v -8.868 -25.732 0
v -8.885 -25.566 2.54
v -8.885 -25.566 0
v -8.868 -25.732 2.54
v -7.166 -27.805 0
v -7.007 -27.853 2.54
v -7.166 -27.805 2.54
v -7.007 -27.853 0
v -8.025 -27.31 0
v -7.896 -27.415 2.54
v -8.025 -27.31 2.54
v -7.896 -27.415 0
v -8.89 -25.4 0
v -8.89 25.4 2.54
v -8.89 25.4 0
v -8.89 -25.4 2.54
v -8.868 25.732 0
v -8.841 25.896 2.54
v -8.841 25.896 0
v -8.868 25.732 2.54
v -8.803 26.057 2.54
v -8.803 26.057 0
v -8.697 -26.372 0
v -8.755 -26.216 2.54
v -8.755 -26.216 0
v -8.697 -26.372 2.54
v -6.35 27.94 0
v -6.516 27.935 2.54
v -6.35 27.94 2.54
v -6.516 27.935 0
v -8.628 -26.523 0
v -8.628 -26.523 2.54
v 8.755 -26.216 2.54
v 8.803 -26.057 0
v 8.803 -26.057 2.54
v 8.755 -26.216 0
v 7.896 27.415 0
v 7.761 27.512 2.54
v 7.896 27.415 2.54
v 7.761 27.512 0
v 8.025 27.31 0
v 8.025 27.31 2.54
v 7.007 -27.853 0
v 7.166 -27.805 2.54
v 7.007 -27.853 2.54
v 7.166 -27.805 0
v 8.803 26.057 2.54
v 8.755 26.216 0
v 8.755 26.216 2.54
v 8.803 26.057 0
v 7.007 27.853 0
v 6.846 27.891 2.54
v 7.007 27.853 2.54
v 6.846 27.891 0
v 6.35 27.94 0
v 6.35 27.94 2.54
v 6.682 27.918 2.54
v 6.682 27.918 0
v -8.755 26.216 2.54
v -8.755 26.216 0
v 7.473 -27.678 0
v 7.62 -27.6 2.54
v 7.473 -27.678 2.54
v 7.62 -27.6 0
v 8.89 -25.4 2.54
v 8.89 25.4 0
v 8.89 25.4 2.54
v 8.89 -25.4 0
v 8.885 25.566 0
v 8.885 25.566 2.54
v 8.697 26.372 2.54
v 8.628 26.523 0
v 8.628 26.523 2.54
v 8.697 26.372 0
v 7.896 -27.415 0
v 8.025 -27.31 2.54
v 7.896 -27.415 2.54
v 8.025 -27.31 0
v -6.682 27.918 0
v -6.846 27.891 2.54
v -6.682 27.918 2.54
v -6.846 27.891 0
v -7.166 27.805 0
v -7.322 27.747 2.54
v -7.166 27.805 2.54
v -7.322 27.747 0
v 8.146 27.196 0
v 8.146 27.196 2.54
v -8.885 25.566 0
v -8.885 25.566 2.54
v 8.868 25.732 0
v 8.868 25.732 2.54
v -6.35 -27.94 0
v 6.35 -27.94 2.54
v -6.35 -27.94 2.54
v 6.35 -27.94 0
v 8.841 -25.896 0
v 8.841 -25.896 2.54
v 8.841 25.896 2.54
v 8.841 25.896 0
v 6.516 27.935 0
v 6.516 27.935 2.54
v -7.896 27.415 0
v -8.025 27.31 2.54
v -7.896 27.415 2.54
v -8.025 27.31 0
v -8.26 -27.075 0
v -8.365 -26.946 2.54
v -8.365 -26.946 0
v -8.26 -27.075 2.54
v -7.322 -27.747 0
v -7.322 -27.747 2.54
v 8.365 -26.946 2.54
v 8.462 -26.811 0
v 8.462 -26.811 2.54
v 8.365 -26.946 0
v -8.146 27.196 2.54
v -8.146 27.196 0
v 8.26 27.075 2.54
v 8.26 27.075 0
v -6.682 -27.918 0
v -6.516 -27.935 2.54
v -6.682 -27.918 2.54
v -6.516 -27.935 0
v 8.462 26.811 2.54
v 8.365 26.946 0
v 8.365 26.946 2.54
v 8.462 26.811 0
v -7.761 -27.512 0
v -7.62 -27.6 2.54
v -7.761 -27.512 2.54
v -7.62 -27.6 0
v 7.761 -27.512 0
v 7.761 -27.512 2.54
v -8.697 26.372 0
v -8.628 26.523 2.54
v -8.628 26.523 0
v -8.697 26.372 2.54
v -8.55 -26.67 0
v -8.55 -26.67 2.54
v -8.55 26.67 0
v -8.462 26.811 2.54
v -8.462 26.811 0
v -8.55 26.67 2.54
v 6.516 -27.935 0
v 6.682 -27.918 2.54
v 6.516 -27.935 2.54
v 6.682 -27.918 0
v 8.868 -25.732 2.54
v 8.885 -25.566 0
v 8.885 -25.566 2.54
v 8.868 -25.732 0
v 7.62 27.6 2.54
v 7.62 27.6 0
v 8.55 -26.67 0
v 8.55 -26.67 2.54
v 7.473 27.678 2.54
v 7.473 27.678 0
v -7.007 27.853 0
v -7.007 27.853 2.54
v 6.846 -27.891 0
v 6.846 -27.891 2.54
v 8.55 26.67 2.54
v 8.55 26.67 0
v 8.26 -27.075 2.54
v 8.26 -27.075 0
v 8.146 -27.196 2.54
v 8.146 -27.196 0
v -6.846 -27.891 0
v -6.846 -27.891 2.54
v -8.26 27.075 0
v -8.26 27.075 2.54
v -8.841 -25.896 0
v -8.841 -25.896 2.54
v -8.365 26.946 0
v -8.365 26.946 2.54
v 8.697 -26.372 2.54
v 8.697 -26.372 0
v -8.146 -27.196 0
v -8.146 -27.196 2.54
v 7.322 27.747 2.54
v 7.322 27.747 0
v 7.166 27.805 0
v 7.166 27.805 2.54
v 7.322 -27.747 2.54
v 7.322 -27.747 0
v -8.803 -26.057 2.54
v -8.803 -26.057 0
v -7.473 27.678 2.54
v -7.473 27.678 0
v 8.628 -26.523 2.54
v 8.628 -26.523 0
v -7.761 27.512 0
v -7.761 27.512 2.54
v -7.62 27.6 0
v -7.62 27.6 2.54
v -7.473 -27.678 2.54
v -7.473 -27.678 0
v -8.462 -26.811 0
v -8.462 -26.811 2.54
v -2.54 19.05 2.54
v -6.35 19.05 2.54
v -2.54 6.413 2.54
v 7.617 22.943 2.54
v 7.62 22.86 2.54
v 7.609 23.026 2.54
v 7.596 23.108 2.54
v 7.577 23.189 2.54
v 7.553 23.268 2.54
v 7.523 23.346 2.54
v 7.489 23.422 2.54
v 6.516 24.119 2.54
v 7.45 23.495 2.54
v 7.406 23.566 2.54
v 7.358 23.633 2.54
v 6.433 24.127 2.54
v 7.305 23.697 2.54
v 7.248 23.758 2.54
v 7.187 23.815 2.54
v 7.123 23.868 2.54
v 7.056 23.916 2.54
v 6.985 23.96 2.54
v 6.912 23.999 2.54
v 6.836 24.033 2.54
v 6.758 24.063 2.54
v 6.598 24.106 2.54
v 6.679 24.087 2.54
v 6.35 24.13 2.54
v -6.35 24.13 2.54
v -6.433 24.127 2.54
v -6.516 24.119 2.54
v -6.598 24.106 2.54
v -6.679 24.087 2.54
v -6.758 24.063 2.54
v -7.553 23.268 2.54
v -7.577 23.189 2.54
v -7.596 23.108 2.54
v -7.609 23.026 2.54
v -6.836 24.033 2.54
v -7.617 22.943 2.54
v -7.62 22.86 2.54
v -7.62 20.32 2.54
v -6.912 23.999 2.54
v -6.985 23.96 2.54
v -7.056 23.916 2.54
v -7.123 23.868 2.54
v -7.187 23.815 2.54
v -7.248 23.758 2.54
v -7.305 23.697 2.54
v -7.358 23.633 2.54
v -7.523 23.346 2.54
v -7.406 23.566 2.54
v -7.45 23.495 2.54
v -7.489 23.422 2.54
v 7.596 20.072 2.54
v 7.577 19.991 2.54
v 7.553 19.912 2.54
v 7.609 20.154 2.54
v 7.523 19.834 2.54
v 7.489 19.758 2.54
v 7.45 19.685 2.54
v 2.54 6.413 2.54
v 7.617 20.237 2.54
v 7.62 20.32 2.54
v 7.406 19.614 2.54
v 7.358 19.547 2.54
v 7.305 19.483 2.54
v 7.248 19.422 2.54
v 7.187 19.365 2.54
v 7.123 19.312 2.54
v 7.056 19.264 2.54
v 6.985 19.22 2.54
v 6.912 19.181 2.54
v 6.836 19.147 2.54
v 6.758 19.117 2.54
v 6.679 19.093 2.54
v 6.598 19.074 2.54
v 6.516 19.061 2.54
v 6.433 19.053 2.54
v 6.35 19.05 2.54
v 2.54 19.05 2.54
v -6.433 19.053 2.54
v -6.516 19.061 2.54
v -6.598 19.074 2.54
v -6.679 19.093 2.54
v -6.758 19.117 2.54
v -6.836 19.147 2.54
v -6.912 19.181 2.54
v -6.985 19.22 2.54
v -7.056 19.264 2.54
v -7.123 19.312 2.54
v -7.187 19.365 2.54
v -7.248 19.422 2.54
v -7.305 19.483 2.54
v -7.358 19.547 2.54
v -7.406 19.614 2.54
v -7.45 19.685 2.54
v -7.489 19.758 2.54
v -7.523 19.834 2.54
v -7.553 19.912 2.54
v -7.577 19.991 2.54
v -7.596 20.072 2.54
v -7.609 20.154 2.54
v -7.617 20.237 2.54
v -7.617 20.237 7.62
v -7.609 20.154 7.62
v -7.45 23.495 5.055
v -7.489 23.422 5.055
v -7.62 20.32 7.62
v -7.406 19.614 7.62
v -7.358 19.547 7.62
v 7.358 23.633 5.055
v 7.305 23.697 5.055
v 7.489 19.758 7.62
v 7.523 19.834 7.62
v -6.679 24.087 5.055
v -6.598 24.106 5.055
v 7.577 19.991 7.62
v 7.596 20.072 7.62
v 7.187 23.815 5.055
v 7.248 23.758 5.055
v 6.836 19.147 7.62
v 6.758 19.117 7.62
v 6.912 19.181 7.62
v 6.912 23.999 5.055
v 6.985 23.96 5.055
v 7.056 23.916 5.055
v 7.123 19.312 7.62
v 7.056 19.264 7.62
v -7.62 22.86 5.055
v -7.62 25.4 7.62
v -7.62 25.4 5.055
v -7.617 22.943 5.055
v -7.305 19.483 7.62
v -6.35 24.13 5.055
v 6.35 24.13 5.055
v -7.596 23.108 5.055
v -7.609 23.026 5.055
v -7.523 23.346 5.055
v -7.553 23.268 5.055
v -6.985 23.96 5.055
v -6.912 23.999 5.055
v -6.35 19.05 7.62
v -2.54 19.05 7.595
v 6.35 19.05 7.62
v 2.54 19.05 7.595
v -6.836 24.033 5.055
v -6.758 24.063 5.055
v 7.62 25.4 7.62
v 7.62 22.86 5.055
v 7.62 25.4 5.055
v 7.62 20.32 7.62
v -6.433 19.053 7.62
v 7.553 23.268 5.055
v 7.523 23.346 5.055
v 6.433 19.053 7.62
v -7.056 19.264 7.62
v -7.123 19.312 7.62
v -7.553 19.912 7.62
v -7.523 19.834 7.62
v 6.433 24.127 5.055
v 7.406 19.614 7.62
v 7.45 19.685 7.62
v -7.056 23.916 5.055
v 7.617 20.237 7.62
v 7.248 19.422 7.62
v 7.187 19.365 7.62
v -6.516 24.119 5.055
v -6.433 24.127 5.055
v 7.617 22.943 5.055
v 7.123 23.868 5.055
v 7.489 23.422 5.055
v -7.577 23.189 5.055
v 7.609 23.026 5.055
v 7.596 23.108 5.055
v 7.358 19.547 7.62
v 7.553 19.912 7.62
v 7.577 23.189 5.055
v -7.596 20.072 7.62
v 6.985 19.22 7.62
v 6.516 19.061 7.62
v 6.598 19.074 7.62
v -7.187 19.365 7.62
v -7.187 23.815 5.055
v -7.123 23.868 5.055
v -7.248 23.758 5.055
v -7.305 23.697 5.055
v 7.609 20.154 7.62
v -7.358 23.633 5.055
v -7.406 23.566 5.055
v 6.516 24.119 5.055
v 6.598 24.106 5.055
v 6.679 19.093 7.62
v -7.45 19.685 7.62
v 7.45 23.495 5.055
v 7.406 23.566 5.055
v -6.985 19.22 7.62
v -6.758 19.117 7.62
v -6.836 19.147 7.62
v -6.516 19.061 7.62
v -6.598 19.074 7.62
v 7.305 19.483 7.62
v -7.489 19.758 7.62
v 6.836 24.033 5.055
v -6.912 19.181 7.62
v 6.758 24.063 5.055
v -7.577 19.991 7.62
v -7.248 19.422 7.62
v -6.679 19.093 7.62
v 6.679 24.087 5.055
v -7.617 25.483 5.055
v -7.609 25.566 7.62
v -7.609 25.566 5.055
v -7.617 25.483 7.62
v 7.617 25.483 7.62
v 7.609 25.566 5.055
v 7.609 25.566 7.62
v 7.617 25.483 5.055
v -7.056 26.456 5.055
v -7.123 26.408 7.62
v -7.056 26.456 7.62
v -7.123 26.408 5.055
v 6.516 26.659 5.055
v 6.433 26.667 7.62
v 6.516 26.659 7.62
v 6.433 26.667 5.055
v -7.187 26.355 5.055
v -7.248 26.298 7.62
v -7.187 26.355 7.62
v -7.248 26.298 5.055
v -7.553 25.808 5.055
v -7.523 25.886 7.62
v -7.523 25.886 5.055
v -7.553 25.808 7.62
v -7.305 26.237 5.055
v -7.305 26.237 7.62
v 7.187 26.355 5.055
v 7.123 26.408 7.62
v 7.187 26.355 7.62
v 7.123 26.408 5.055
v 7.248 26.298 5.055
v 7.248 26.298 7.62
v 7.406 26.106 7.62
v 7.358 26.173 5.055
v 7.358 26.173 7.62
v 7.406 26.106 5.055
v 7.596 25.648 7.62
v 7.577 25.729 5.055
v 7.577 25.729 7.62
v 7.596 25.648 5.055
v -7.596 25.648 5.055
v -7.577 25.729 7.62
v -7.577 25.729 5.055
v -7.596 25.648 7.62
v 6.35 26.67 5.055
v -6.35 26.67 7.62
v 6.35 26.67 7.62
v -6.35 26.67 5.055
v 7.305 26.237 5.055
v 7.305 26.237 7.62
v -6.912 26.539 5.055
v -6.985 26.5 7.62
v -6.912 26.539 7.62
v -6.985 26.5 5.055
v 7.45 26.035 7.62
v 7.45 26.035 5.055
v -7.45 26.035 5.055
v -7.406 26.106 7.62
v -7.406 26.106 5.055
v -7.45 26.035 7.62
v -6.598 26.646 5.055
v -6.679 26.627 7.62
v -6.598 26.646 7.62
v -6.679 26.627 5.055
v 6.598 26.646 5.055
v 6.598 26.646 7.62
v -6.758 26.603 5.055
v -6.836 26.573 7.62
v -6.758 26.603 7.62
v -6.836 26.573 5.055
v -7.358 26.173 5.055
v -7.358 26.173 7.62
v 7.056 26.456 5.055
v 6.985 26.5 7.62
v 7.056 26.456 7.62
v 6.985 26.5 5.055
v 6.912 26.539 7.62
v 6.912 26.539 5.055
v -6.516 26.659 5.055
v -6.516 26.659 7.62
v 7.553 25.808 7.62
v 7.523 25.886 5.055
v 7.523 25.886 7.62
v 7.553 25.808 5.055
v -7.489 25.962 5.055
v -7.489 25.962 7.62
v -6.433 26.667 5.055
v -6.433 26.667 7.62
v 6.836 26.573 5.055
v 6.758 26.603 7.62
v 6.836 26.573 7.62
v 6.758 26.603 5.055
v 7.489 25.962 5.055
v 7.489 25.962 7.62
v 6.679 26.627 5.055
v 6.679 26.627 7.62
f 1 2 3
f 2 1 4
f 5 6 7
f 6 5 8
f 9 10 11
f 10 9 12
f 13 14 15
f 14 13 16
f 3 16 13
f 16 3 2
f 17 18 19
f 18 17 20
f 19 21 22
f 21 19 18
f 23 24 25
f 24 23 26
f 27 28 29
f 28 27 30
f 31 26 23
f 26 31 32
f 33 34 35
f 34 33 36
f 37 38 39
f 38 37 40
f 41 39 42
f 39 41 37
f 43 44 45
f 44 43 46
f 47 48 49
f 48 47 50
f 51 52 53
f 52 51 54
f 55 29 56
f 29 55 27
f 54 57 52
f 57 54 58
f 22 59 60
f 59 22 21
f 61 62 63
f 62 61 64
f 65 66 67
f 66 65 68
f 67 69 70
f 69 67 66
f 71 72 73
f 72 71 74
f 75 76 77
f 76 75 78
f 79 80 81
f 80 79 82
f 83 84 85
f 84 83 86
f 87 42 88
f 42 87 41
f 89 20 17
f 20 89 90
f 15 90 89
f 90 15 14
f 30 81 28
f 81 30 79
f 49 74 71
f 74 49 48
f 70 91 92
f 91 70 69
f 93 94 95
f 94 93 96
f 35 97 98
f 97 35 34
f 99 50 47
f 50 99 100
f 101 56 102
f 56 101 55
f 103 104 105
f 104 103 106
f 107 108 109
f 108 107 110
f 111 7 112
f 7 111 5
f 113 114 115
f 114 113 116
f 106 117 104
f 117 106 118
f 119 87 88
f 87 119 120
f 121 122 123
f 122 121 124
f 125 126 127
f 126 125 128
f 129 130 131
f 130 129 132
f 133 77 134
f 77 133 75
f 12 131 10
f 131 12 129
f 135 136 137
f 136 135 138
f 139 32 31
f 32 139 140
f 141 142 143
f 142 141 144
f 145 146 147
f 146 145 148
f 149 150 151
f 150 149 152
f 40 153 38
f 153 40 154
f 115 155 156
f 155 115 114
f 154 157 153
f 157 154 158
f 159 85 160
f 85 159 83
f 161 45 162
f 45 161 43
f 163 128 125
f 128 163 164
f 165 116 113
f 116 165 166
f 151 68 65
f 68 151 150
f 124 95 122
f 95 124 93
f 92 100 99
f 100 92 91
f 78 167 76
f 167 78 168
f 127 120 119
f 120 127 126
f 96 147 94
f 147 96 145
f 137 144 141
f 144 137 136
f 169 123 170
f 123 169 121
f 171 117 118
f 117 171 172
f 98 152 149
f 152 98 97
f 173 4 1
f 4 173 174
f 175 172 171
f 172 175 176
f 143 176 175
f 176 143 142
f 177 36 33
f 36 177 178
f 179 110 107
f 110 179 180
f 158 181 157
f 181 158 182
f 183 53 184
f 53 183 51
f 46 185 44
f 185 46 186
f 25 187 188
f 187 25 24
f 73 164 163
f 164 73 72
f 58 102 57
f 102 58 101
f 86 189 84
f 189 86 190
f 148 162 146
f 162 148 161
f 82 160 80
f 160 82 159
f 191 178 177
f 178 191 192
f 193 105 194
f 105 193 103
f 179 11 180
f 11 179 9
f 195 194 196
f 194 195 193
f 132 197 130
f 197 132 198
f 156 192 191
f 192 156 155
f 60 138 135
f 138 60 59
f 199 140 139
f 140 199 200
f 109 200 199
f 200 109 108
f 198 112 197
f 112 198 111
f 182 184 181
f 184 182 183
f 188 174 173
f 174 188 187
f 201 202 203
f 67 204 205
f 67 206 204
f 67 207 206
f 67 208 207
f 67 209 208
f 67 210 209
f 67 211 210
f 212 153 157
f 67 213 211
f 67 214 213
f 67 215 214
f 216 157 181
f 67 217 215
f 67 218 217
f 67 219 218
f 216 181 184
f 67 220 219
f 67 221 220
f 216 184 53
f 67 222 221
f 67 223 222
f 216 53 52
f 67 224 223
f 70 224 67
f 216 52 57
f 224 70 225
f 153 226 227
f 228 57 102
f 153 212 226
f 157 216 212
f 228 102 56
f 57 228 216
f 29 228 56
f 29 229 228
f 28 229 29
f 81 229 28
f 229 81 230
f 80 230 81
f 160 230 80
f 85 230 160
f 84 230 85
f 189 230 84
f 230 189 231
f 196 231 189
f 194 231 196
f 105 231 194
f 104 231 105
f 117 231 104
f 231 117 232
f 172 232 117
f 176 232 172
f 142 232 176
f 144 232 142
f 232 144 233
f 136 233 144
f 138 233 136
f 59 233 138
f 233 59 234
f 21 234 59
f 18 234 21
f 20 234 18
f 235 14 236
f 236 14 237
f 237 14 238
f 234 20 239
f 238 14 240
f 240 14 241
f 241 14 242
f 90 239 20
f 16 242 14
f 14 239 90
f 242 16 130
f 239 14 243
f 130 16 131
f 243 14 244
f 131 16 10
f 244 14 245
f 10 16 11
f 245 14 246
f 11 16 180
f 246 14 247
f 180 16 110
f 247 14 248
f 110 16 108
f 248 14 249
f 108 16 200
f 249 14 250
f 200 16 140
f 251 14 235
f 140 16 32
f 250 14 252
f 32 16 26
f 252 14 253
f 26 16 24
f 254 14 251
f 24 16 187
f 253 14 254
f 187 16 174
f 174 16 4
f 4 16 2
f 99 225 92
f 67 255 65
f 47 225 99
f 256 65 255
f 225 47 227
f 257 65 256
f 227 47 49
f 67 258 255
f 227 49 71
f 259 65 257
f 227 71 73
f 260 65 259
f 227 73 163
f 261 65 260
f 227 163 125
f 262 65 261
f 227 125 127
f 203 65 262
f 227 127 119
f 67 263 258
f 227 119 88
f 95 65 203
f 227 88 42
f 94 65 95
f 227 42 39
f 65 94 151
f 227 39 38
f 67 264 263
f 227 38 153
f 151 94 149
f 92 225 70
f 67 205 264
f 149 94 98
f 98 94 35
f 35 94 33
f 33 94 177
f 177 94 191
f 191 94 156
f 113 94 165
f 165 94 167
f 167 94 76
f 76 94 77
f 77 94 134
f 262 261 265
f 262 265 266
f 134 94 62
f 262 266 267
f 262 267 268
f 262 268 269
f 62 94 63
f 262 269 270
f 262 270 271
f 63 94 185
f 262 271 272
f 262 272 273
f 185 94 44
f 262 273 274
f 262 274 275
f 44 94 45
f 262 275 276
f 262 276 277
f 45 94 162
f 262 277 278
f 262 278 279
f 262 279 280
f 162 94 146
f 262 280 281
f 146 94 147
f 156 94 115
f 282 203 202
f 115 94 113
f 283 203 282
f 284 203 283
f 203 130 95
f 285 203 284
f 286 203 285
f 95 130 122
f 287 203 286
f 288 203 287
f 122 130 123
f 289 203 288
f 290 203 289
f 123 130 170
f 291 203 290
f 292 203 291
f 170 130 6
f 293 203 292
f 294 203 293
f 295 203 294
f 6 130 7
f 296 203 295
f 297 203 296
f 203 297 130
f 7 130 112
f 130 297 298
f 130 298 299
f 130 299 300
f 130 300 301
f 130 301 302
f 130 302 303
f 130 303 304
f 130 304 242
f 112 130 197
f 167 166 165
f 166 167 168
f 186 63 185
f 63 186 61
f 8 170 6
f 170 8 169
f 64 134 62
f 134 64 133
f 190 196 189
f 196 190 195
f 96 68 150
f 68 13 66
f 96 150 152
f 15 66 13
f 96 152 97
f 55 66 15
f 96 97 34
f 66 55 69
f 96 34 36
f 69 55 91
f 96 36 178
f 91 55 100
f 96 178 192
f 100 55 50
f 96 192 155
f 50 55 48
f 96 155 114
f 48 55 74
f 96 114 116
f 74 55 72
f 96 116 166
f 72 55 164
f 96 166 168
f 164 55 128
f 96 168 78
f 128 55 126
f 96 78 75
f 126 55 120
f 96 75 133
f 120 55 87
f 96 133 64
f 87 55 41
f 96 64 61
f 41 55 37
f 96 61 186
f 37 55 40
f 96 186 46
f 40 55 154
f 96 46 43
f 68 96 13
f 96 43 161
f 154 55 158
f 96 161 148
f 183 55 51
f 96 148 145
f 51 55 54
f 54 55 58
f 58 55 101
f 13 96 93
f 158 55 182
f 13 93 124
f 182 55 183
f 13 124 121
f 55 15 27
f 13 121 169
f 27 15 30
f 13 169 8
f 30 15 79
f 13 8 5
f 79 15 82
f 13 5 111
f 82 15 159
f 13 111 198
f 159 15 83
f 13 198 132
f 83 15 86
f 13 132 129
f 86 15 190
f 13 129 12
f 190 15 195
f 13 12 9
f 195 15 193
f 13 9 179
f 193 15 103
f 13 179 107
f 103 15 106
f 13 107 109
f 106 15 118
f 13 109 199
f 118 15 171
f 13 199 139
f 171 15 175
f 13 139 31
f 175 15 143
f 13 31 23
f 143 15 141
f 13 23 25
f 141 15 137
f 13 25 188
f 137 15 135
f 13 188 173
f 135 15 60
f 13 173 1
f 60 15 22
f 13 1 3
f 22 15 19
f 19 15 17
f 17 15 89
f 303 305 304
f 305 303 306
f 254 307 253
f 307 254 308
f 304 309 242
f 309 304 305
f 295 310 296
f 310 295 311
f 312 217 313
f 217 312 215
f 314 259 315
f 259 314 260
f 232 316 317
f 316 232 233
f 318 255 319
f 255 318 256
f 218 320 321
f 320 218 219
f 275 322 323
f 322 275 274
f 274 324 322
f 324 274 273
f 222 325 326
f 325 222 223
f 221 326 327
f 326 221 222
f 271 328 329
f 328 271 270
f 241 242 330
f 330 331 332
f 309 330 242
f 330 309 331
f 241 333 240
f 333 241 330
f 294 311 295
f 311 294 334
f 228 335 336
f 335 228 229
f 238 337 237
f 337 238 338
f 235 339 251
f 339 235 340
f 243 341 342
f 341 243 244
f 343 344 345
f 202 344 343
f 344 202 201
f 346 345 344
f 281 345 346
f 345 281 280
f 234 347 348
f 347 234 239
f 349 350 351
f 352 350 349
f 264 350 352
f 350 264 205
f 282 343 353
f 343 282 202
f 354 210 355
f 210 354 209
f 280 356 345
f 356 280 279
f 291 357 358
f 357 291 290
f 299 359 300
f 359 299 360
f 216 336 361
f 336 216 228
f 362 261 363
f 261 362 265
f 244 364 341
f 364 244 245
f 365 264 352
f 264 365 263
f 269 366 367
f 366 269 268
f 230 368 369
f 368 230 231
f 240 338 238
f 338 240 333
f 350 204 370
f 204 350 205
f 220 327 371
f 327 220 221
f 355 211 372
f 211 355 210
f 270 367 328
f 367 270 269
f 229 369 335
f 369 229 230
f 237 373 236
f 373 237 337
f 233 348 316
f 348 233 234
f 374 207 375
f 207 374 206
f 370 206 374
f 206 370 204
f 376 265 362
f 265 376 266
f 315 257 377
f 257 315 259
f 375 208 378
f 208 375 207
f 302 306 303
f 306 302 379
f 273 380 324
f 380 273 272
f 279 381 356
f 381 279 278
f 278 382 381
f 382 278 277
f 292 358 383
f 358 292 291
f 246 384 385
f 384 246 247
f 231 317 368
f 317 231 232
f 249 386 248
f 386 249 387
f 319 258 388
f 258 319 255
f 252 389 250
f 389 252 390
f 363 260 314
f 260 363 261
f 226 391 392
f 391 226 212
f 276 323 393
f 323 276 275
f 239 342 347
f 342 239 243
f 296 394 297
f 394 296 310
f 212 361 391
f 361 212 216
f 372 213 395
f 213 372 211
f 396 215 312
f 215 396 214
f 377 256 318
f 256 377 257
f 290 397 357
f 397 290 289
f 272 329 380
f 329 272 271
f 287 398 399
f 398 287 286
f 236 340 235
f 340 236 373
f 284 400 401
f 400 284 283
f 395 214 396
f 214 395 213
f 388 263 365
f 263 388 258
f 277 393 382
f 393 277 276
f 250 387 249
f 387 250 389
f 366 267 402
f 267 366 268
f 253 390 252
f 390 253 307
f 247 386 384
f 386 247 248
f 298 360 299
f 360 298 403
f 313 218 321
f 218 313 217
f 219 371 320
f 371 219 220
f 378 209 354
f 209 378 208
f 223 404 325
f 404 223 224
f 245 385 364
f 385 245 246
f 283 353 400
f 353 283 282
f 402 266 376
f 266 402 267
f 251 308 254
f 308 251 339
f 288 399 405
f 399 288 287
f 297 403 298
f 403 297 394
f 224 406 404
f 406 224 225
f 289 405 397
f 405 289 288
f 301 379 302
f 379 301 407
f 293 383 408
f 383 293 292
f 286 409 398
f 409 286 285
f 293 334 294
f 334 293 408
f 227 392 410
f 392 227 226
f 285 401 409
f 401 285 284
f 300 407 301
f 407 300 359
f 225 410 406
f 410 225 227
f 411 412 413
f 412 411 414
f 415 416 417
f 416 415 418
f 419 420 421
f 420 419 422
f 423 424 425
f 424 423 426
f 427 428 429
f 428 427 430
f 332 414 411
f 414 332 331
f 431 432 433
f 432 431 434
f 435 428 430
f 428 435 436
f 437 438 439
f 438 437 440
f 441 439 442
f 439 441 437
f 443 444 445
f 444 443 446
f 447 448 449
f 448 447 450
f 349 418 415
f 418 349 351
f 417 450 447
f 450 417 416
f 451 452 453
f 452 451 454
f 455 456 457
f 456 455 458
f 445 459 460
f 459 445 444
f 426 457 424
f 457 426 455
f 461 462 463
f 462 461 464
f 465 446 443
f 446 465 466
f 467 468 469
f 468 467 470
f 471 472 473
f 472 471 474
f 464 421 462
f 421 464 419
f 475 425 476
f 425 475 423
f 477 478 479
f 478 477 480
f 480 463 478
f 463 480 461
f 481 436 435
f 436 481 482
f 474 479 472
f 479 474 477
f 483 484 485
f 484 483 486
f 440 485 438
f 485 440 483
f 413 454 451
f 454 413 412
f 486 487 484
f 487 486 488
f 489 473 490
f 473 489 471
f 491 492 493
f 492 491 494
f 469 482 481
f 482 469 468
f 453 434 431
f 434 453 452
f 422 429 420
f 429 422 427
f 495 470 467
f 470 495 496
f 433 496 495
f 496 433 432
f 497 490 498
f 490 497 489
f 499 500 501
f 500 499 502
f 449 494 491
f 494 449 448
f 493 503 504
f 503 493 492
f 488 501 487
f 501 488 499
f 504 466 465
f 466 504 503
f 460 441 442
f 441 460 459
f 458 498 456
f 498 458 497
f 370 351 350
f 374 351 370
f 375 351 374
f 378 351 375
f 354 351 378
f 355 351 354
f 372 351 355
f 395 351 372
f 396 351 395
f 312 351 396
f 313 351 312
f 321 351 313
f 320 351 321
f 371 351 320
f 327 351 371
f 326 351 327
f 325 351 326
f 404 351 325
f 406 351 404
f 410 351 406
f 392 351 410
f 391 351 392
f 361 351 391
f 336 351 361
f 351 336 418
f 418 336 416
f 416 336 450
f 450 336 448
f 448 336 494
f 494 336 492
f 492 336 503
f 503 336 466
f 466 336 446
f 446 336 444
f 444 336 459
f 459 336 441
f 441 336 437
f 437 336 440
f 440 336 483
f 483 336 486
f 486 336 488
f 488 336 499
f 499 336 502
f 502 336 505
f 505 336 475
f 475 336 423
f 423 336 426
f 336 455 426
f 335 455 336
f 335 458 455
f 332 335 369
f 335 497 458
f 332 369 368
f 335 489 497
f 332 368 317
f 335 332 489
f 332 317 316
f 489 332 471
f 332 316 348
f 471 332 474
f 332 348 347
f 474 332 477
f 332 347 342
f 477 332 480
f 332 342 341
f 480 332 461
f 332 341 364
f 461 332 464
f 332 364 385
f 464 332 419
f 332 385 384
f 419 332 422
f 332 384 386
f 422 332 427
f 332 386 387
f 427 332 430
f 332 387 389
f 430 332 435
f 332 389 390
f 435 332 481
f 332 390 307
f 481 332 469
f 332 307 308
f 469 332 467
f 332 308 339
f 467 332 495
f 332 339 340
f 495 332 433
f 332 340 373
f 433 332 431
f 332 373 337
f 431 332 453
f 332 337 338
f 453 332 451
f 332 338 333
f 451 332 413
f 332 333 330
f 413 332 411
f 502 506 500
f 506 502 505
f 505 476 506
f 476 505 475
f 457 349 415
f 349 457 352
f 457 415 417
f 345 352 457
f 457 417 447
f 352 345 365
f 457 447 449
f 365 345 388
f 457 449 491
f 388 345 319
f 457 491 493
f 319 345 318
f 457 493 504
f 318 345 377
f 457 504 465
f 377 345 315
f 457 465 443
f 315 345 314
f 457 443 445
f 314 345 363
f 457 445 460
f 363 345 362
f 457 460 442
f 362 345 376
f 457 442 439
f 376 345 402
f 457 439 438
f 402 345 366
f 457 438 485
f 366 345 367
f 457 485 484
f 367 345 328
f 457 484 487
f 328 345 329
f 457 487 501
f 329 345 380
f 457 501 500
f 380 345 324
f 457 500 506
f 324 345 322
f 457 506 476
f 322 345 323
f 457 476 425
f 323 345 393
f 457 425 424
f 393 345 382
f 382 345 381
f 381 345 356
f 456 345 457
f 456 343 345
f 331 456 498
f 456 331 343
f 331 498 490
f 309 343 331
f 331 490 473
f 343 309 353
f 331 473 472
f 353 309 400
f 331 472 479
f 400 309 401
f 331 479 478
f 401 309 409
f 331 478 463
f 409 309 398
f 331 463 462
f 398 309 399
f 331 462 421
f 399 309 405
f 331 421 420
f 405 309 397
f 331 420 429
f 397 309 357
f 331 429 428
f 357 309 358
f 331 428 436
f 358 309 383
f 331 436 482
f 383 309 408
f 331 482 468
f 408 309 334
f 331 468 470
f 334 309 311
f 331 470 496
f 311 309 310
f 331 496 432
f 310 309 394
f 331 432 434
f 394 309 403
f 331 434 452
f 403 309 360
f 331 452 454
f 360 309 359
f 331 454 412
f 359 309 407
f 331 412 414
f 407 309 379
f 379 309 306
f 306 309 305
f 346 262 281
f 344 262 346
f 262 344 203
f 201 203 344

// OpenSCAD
ViewScale = [0.0254, 0.0254, 0.0254];

module case()
{
}

module forViewing()
{
    w = 500;
    h = 2000;

    linear_extrude(100)
    hull()
    {
        translate([-w/2, h/2, 0])
        circle(100, $fn=96);
        translate([w/2, h/2, 0])
        circle(100, $fn=96);
        translate([-w/2, -h/2, 0])
        circle(100, $fn=96);
        translate([w/2, -h/2, 0])
        circle(100, $fn=96);
    }

    translate([0, 0, 99])
    linear_extrude(101)
    hull()
    {
        translate([-w/2, h/2-200, 0])
        circle(50, $fn=96);
        translate([w/2, h/2-200, 0])
        circle(50, $fn=96);

        translate([-w/2, h/2-100, 0])
        circle(50, $fn=96);
        translate([w/2, h/2-100, 0])
        circle(50, $fn=96);
    }

    translate([0, 0, 199])
    linear_extrude(101)
    hull()
    {
        translate([-w/2, h/2-200, 0])
        circle(50, $fn=96);
        translate([w/2, h/2-200, 0])
        circle(50, $fn=96);

        translate([-w/2, h/2, 0])
        circle(50, $fn=96);
        translate([w/2, h/2, 0])
        circle(50, $fn=96);
    }


    translate([100, 500, 99])
    rotate([0, -90, 0])
    linear_extrude(200)
    polygon([[0, -250], [0, 250], [200, 250]]);



}

module forPrinting()
{
}

scale(ViewScale)
{
    forViewing();
}
